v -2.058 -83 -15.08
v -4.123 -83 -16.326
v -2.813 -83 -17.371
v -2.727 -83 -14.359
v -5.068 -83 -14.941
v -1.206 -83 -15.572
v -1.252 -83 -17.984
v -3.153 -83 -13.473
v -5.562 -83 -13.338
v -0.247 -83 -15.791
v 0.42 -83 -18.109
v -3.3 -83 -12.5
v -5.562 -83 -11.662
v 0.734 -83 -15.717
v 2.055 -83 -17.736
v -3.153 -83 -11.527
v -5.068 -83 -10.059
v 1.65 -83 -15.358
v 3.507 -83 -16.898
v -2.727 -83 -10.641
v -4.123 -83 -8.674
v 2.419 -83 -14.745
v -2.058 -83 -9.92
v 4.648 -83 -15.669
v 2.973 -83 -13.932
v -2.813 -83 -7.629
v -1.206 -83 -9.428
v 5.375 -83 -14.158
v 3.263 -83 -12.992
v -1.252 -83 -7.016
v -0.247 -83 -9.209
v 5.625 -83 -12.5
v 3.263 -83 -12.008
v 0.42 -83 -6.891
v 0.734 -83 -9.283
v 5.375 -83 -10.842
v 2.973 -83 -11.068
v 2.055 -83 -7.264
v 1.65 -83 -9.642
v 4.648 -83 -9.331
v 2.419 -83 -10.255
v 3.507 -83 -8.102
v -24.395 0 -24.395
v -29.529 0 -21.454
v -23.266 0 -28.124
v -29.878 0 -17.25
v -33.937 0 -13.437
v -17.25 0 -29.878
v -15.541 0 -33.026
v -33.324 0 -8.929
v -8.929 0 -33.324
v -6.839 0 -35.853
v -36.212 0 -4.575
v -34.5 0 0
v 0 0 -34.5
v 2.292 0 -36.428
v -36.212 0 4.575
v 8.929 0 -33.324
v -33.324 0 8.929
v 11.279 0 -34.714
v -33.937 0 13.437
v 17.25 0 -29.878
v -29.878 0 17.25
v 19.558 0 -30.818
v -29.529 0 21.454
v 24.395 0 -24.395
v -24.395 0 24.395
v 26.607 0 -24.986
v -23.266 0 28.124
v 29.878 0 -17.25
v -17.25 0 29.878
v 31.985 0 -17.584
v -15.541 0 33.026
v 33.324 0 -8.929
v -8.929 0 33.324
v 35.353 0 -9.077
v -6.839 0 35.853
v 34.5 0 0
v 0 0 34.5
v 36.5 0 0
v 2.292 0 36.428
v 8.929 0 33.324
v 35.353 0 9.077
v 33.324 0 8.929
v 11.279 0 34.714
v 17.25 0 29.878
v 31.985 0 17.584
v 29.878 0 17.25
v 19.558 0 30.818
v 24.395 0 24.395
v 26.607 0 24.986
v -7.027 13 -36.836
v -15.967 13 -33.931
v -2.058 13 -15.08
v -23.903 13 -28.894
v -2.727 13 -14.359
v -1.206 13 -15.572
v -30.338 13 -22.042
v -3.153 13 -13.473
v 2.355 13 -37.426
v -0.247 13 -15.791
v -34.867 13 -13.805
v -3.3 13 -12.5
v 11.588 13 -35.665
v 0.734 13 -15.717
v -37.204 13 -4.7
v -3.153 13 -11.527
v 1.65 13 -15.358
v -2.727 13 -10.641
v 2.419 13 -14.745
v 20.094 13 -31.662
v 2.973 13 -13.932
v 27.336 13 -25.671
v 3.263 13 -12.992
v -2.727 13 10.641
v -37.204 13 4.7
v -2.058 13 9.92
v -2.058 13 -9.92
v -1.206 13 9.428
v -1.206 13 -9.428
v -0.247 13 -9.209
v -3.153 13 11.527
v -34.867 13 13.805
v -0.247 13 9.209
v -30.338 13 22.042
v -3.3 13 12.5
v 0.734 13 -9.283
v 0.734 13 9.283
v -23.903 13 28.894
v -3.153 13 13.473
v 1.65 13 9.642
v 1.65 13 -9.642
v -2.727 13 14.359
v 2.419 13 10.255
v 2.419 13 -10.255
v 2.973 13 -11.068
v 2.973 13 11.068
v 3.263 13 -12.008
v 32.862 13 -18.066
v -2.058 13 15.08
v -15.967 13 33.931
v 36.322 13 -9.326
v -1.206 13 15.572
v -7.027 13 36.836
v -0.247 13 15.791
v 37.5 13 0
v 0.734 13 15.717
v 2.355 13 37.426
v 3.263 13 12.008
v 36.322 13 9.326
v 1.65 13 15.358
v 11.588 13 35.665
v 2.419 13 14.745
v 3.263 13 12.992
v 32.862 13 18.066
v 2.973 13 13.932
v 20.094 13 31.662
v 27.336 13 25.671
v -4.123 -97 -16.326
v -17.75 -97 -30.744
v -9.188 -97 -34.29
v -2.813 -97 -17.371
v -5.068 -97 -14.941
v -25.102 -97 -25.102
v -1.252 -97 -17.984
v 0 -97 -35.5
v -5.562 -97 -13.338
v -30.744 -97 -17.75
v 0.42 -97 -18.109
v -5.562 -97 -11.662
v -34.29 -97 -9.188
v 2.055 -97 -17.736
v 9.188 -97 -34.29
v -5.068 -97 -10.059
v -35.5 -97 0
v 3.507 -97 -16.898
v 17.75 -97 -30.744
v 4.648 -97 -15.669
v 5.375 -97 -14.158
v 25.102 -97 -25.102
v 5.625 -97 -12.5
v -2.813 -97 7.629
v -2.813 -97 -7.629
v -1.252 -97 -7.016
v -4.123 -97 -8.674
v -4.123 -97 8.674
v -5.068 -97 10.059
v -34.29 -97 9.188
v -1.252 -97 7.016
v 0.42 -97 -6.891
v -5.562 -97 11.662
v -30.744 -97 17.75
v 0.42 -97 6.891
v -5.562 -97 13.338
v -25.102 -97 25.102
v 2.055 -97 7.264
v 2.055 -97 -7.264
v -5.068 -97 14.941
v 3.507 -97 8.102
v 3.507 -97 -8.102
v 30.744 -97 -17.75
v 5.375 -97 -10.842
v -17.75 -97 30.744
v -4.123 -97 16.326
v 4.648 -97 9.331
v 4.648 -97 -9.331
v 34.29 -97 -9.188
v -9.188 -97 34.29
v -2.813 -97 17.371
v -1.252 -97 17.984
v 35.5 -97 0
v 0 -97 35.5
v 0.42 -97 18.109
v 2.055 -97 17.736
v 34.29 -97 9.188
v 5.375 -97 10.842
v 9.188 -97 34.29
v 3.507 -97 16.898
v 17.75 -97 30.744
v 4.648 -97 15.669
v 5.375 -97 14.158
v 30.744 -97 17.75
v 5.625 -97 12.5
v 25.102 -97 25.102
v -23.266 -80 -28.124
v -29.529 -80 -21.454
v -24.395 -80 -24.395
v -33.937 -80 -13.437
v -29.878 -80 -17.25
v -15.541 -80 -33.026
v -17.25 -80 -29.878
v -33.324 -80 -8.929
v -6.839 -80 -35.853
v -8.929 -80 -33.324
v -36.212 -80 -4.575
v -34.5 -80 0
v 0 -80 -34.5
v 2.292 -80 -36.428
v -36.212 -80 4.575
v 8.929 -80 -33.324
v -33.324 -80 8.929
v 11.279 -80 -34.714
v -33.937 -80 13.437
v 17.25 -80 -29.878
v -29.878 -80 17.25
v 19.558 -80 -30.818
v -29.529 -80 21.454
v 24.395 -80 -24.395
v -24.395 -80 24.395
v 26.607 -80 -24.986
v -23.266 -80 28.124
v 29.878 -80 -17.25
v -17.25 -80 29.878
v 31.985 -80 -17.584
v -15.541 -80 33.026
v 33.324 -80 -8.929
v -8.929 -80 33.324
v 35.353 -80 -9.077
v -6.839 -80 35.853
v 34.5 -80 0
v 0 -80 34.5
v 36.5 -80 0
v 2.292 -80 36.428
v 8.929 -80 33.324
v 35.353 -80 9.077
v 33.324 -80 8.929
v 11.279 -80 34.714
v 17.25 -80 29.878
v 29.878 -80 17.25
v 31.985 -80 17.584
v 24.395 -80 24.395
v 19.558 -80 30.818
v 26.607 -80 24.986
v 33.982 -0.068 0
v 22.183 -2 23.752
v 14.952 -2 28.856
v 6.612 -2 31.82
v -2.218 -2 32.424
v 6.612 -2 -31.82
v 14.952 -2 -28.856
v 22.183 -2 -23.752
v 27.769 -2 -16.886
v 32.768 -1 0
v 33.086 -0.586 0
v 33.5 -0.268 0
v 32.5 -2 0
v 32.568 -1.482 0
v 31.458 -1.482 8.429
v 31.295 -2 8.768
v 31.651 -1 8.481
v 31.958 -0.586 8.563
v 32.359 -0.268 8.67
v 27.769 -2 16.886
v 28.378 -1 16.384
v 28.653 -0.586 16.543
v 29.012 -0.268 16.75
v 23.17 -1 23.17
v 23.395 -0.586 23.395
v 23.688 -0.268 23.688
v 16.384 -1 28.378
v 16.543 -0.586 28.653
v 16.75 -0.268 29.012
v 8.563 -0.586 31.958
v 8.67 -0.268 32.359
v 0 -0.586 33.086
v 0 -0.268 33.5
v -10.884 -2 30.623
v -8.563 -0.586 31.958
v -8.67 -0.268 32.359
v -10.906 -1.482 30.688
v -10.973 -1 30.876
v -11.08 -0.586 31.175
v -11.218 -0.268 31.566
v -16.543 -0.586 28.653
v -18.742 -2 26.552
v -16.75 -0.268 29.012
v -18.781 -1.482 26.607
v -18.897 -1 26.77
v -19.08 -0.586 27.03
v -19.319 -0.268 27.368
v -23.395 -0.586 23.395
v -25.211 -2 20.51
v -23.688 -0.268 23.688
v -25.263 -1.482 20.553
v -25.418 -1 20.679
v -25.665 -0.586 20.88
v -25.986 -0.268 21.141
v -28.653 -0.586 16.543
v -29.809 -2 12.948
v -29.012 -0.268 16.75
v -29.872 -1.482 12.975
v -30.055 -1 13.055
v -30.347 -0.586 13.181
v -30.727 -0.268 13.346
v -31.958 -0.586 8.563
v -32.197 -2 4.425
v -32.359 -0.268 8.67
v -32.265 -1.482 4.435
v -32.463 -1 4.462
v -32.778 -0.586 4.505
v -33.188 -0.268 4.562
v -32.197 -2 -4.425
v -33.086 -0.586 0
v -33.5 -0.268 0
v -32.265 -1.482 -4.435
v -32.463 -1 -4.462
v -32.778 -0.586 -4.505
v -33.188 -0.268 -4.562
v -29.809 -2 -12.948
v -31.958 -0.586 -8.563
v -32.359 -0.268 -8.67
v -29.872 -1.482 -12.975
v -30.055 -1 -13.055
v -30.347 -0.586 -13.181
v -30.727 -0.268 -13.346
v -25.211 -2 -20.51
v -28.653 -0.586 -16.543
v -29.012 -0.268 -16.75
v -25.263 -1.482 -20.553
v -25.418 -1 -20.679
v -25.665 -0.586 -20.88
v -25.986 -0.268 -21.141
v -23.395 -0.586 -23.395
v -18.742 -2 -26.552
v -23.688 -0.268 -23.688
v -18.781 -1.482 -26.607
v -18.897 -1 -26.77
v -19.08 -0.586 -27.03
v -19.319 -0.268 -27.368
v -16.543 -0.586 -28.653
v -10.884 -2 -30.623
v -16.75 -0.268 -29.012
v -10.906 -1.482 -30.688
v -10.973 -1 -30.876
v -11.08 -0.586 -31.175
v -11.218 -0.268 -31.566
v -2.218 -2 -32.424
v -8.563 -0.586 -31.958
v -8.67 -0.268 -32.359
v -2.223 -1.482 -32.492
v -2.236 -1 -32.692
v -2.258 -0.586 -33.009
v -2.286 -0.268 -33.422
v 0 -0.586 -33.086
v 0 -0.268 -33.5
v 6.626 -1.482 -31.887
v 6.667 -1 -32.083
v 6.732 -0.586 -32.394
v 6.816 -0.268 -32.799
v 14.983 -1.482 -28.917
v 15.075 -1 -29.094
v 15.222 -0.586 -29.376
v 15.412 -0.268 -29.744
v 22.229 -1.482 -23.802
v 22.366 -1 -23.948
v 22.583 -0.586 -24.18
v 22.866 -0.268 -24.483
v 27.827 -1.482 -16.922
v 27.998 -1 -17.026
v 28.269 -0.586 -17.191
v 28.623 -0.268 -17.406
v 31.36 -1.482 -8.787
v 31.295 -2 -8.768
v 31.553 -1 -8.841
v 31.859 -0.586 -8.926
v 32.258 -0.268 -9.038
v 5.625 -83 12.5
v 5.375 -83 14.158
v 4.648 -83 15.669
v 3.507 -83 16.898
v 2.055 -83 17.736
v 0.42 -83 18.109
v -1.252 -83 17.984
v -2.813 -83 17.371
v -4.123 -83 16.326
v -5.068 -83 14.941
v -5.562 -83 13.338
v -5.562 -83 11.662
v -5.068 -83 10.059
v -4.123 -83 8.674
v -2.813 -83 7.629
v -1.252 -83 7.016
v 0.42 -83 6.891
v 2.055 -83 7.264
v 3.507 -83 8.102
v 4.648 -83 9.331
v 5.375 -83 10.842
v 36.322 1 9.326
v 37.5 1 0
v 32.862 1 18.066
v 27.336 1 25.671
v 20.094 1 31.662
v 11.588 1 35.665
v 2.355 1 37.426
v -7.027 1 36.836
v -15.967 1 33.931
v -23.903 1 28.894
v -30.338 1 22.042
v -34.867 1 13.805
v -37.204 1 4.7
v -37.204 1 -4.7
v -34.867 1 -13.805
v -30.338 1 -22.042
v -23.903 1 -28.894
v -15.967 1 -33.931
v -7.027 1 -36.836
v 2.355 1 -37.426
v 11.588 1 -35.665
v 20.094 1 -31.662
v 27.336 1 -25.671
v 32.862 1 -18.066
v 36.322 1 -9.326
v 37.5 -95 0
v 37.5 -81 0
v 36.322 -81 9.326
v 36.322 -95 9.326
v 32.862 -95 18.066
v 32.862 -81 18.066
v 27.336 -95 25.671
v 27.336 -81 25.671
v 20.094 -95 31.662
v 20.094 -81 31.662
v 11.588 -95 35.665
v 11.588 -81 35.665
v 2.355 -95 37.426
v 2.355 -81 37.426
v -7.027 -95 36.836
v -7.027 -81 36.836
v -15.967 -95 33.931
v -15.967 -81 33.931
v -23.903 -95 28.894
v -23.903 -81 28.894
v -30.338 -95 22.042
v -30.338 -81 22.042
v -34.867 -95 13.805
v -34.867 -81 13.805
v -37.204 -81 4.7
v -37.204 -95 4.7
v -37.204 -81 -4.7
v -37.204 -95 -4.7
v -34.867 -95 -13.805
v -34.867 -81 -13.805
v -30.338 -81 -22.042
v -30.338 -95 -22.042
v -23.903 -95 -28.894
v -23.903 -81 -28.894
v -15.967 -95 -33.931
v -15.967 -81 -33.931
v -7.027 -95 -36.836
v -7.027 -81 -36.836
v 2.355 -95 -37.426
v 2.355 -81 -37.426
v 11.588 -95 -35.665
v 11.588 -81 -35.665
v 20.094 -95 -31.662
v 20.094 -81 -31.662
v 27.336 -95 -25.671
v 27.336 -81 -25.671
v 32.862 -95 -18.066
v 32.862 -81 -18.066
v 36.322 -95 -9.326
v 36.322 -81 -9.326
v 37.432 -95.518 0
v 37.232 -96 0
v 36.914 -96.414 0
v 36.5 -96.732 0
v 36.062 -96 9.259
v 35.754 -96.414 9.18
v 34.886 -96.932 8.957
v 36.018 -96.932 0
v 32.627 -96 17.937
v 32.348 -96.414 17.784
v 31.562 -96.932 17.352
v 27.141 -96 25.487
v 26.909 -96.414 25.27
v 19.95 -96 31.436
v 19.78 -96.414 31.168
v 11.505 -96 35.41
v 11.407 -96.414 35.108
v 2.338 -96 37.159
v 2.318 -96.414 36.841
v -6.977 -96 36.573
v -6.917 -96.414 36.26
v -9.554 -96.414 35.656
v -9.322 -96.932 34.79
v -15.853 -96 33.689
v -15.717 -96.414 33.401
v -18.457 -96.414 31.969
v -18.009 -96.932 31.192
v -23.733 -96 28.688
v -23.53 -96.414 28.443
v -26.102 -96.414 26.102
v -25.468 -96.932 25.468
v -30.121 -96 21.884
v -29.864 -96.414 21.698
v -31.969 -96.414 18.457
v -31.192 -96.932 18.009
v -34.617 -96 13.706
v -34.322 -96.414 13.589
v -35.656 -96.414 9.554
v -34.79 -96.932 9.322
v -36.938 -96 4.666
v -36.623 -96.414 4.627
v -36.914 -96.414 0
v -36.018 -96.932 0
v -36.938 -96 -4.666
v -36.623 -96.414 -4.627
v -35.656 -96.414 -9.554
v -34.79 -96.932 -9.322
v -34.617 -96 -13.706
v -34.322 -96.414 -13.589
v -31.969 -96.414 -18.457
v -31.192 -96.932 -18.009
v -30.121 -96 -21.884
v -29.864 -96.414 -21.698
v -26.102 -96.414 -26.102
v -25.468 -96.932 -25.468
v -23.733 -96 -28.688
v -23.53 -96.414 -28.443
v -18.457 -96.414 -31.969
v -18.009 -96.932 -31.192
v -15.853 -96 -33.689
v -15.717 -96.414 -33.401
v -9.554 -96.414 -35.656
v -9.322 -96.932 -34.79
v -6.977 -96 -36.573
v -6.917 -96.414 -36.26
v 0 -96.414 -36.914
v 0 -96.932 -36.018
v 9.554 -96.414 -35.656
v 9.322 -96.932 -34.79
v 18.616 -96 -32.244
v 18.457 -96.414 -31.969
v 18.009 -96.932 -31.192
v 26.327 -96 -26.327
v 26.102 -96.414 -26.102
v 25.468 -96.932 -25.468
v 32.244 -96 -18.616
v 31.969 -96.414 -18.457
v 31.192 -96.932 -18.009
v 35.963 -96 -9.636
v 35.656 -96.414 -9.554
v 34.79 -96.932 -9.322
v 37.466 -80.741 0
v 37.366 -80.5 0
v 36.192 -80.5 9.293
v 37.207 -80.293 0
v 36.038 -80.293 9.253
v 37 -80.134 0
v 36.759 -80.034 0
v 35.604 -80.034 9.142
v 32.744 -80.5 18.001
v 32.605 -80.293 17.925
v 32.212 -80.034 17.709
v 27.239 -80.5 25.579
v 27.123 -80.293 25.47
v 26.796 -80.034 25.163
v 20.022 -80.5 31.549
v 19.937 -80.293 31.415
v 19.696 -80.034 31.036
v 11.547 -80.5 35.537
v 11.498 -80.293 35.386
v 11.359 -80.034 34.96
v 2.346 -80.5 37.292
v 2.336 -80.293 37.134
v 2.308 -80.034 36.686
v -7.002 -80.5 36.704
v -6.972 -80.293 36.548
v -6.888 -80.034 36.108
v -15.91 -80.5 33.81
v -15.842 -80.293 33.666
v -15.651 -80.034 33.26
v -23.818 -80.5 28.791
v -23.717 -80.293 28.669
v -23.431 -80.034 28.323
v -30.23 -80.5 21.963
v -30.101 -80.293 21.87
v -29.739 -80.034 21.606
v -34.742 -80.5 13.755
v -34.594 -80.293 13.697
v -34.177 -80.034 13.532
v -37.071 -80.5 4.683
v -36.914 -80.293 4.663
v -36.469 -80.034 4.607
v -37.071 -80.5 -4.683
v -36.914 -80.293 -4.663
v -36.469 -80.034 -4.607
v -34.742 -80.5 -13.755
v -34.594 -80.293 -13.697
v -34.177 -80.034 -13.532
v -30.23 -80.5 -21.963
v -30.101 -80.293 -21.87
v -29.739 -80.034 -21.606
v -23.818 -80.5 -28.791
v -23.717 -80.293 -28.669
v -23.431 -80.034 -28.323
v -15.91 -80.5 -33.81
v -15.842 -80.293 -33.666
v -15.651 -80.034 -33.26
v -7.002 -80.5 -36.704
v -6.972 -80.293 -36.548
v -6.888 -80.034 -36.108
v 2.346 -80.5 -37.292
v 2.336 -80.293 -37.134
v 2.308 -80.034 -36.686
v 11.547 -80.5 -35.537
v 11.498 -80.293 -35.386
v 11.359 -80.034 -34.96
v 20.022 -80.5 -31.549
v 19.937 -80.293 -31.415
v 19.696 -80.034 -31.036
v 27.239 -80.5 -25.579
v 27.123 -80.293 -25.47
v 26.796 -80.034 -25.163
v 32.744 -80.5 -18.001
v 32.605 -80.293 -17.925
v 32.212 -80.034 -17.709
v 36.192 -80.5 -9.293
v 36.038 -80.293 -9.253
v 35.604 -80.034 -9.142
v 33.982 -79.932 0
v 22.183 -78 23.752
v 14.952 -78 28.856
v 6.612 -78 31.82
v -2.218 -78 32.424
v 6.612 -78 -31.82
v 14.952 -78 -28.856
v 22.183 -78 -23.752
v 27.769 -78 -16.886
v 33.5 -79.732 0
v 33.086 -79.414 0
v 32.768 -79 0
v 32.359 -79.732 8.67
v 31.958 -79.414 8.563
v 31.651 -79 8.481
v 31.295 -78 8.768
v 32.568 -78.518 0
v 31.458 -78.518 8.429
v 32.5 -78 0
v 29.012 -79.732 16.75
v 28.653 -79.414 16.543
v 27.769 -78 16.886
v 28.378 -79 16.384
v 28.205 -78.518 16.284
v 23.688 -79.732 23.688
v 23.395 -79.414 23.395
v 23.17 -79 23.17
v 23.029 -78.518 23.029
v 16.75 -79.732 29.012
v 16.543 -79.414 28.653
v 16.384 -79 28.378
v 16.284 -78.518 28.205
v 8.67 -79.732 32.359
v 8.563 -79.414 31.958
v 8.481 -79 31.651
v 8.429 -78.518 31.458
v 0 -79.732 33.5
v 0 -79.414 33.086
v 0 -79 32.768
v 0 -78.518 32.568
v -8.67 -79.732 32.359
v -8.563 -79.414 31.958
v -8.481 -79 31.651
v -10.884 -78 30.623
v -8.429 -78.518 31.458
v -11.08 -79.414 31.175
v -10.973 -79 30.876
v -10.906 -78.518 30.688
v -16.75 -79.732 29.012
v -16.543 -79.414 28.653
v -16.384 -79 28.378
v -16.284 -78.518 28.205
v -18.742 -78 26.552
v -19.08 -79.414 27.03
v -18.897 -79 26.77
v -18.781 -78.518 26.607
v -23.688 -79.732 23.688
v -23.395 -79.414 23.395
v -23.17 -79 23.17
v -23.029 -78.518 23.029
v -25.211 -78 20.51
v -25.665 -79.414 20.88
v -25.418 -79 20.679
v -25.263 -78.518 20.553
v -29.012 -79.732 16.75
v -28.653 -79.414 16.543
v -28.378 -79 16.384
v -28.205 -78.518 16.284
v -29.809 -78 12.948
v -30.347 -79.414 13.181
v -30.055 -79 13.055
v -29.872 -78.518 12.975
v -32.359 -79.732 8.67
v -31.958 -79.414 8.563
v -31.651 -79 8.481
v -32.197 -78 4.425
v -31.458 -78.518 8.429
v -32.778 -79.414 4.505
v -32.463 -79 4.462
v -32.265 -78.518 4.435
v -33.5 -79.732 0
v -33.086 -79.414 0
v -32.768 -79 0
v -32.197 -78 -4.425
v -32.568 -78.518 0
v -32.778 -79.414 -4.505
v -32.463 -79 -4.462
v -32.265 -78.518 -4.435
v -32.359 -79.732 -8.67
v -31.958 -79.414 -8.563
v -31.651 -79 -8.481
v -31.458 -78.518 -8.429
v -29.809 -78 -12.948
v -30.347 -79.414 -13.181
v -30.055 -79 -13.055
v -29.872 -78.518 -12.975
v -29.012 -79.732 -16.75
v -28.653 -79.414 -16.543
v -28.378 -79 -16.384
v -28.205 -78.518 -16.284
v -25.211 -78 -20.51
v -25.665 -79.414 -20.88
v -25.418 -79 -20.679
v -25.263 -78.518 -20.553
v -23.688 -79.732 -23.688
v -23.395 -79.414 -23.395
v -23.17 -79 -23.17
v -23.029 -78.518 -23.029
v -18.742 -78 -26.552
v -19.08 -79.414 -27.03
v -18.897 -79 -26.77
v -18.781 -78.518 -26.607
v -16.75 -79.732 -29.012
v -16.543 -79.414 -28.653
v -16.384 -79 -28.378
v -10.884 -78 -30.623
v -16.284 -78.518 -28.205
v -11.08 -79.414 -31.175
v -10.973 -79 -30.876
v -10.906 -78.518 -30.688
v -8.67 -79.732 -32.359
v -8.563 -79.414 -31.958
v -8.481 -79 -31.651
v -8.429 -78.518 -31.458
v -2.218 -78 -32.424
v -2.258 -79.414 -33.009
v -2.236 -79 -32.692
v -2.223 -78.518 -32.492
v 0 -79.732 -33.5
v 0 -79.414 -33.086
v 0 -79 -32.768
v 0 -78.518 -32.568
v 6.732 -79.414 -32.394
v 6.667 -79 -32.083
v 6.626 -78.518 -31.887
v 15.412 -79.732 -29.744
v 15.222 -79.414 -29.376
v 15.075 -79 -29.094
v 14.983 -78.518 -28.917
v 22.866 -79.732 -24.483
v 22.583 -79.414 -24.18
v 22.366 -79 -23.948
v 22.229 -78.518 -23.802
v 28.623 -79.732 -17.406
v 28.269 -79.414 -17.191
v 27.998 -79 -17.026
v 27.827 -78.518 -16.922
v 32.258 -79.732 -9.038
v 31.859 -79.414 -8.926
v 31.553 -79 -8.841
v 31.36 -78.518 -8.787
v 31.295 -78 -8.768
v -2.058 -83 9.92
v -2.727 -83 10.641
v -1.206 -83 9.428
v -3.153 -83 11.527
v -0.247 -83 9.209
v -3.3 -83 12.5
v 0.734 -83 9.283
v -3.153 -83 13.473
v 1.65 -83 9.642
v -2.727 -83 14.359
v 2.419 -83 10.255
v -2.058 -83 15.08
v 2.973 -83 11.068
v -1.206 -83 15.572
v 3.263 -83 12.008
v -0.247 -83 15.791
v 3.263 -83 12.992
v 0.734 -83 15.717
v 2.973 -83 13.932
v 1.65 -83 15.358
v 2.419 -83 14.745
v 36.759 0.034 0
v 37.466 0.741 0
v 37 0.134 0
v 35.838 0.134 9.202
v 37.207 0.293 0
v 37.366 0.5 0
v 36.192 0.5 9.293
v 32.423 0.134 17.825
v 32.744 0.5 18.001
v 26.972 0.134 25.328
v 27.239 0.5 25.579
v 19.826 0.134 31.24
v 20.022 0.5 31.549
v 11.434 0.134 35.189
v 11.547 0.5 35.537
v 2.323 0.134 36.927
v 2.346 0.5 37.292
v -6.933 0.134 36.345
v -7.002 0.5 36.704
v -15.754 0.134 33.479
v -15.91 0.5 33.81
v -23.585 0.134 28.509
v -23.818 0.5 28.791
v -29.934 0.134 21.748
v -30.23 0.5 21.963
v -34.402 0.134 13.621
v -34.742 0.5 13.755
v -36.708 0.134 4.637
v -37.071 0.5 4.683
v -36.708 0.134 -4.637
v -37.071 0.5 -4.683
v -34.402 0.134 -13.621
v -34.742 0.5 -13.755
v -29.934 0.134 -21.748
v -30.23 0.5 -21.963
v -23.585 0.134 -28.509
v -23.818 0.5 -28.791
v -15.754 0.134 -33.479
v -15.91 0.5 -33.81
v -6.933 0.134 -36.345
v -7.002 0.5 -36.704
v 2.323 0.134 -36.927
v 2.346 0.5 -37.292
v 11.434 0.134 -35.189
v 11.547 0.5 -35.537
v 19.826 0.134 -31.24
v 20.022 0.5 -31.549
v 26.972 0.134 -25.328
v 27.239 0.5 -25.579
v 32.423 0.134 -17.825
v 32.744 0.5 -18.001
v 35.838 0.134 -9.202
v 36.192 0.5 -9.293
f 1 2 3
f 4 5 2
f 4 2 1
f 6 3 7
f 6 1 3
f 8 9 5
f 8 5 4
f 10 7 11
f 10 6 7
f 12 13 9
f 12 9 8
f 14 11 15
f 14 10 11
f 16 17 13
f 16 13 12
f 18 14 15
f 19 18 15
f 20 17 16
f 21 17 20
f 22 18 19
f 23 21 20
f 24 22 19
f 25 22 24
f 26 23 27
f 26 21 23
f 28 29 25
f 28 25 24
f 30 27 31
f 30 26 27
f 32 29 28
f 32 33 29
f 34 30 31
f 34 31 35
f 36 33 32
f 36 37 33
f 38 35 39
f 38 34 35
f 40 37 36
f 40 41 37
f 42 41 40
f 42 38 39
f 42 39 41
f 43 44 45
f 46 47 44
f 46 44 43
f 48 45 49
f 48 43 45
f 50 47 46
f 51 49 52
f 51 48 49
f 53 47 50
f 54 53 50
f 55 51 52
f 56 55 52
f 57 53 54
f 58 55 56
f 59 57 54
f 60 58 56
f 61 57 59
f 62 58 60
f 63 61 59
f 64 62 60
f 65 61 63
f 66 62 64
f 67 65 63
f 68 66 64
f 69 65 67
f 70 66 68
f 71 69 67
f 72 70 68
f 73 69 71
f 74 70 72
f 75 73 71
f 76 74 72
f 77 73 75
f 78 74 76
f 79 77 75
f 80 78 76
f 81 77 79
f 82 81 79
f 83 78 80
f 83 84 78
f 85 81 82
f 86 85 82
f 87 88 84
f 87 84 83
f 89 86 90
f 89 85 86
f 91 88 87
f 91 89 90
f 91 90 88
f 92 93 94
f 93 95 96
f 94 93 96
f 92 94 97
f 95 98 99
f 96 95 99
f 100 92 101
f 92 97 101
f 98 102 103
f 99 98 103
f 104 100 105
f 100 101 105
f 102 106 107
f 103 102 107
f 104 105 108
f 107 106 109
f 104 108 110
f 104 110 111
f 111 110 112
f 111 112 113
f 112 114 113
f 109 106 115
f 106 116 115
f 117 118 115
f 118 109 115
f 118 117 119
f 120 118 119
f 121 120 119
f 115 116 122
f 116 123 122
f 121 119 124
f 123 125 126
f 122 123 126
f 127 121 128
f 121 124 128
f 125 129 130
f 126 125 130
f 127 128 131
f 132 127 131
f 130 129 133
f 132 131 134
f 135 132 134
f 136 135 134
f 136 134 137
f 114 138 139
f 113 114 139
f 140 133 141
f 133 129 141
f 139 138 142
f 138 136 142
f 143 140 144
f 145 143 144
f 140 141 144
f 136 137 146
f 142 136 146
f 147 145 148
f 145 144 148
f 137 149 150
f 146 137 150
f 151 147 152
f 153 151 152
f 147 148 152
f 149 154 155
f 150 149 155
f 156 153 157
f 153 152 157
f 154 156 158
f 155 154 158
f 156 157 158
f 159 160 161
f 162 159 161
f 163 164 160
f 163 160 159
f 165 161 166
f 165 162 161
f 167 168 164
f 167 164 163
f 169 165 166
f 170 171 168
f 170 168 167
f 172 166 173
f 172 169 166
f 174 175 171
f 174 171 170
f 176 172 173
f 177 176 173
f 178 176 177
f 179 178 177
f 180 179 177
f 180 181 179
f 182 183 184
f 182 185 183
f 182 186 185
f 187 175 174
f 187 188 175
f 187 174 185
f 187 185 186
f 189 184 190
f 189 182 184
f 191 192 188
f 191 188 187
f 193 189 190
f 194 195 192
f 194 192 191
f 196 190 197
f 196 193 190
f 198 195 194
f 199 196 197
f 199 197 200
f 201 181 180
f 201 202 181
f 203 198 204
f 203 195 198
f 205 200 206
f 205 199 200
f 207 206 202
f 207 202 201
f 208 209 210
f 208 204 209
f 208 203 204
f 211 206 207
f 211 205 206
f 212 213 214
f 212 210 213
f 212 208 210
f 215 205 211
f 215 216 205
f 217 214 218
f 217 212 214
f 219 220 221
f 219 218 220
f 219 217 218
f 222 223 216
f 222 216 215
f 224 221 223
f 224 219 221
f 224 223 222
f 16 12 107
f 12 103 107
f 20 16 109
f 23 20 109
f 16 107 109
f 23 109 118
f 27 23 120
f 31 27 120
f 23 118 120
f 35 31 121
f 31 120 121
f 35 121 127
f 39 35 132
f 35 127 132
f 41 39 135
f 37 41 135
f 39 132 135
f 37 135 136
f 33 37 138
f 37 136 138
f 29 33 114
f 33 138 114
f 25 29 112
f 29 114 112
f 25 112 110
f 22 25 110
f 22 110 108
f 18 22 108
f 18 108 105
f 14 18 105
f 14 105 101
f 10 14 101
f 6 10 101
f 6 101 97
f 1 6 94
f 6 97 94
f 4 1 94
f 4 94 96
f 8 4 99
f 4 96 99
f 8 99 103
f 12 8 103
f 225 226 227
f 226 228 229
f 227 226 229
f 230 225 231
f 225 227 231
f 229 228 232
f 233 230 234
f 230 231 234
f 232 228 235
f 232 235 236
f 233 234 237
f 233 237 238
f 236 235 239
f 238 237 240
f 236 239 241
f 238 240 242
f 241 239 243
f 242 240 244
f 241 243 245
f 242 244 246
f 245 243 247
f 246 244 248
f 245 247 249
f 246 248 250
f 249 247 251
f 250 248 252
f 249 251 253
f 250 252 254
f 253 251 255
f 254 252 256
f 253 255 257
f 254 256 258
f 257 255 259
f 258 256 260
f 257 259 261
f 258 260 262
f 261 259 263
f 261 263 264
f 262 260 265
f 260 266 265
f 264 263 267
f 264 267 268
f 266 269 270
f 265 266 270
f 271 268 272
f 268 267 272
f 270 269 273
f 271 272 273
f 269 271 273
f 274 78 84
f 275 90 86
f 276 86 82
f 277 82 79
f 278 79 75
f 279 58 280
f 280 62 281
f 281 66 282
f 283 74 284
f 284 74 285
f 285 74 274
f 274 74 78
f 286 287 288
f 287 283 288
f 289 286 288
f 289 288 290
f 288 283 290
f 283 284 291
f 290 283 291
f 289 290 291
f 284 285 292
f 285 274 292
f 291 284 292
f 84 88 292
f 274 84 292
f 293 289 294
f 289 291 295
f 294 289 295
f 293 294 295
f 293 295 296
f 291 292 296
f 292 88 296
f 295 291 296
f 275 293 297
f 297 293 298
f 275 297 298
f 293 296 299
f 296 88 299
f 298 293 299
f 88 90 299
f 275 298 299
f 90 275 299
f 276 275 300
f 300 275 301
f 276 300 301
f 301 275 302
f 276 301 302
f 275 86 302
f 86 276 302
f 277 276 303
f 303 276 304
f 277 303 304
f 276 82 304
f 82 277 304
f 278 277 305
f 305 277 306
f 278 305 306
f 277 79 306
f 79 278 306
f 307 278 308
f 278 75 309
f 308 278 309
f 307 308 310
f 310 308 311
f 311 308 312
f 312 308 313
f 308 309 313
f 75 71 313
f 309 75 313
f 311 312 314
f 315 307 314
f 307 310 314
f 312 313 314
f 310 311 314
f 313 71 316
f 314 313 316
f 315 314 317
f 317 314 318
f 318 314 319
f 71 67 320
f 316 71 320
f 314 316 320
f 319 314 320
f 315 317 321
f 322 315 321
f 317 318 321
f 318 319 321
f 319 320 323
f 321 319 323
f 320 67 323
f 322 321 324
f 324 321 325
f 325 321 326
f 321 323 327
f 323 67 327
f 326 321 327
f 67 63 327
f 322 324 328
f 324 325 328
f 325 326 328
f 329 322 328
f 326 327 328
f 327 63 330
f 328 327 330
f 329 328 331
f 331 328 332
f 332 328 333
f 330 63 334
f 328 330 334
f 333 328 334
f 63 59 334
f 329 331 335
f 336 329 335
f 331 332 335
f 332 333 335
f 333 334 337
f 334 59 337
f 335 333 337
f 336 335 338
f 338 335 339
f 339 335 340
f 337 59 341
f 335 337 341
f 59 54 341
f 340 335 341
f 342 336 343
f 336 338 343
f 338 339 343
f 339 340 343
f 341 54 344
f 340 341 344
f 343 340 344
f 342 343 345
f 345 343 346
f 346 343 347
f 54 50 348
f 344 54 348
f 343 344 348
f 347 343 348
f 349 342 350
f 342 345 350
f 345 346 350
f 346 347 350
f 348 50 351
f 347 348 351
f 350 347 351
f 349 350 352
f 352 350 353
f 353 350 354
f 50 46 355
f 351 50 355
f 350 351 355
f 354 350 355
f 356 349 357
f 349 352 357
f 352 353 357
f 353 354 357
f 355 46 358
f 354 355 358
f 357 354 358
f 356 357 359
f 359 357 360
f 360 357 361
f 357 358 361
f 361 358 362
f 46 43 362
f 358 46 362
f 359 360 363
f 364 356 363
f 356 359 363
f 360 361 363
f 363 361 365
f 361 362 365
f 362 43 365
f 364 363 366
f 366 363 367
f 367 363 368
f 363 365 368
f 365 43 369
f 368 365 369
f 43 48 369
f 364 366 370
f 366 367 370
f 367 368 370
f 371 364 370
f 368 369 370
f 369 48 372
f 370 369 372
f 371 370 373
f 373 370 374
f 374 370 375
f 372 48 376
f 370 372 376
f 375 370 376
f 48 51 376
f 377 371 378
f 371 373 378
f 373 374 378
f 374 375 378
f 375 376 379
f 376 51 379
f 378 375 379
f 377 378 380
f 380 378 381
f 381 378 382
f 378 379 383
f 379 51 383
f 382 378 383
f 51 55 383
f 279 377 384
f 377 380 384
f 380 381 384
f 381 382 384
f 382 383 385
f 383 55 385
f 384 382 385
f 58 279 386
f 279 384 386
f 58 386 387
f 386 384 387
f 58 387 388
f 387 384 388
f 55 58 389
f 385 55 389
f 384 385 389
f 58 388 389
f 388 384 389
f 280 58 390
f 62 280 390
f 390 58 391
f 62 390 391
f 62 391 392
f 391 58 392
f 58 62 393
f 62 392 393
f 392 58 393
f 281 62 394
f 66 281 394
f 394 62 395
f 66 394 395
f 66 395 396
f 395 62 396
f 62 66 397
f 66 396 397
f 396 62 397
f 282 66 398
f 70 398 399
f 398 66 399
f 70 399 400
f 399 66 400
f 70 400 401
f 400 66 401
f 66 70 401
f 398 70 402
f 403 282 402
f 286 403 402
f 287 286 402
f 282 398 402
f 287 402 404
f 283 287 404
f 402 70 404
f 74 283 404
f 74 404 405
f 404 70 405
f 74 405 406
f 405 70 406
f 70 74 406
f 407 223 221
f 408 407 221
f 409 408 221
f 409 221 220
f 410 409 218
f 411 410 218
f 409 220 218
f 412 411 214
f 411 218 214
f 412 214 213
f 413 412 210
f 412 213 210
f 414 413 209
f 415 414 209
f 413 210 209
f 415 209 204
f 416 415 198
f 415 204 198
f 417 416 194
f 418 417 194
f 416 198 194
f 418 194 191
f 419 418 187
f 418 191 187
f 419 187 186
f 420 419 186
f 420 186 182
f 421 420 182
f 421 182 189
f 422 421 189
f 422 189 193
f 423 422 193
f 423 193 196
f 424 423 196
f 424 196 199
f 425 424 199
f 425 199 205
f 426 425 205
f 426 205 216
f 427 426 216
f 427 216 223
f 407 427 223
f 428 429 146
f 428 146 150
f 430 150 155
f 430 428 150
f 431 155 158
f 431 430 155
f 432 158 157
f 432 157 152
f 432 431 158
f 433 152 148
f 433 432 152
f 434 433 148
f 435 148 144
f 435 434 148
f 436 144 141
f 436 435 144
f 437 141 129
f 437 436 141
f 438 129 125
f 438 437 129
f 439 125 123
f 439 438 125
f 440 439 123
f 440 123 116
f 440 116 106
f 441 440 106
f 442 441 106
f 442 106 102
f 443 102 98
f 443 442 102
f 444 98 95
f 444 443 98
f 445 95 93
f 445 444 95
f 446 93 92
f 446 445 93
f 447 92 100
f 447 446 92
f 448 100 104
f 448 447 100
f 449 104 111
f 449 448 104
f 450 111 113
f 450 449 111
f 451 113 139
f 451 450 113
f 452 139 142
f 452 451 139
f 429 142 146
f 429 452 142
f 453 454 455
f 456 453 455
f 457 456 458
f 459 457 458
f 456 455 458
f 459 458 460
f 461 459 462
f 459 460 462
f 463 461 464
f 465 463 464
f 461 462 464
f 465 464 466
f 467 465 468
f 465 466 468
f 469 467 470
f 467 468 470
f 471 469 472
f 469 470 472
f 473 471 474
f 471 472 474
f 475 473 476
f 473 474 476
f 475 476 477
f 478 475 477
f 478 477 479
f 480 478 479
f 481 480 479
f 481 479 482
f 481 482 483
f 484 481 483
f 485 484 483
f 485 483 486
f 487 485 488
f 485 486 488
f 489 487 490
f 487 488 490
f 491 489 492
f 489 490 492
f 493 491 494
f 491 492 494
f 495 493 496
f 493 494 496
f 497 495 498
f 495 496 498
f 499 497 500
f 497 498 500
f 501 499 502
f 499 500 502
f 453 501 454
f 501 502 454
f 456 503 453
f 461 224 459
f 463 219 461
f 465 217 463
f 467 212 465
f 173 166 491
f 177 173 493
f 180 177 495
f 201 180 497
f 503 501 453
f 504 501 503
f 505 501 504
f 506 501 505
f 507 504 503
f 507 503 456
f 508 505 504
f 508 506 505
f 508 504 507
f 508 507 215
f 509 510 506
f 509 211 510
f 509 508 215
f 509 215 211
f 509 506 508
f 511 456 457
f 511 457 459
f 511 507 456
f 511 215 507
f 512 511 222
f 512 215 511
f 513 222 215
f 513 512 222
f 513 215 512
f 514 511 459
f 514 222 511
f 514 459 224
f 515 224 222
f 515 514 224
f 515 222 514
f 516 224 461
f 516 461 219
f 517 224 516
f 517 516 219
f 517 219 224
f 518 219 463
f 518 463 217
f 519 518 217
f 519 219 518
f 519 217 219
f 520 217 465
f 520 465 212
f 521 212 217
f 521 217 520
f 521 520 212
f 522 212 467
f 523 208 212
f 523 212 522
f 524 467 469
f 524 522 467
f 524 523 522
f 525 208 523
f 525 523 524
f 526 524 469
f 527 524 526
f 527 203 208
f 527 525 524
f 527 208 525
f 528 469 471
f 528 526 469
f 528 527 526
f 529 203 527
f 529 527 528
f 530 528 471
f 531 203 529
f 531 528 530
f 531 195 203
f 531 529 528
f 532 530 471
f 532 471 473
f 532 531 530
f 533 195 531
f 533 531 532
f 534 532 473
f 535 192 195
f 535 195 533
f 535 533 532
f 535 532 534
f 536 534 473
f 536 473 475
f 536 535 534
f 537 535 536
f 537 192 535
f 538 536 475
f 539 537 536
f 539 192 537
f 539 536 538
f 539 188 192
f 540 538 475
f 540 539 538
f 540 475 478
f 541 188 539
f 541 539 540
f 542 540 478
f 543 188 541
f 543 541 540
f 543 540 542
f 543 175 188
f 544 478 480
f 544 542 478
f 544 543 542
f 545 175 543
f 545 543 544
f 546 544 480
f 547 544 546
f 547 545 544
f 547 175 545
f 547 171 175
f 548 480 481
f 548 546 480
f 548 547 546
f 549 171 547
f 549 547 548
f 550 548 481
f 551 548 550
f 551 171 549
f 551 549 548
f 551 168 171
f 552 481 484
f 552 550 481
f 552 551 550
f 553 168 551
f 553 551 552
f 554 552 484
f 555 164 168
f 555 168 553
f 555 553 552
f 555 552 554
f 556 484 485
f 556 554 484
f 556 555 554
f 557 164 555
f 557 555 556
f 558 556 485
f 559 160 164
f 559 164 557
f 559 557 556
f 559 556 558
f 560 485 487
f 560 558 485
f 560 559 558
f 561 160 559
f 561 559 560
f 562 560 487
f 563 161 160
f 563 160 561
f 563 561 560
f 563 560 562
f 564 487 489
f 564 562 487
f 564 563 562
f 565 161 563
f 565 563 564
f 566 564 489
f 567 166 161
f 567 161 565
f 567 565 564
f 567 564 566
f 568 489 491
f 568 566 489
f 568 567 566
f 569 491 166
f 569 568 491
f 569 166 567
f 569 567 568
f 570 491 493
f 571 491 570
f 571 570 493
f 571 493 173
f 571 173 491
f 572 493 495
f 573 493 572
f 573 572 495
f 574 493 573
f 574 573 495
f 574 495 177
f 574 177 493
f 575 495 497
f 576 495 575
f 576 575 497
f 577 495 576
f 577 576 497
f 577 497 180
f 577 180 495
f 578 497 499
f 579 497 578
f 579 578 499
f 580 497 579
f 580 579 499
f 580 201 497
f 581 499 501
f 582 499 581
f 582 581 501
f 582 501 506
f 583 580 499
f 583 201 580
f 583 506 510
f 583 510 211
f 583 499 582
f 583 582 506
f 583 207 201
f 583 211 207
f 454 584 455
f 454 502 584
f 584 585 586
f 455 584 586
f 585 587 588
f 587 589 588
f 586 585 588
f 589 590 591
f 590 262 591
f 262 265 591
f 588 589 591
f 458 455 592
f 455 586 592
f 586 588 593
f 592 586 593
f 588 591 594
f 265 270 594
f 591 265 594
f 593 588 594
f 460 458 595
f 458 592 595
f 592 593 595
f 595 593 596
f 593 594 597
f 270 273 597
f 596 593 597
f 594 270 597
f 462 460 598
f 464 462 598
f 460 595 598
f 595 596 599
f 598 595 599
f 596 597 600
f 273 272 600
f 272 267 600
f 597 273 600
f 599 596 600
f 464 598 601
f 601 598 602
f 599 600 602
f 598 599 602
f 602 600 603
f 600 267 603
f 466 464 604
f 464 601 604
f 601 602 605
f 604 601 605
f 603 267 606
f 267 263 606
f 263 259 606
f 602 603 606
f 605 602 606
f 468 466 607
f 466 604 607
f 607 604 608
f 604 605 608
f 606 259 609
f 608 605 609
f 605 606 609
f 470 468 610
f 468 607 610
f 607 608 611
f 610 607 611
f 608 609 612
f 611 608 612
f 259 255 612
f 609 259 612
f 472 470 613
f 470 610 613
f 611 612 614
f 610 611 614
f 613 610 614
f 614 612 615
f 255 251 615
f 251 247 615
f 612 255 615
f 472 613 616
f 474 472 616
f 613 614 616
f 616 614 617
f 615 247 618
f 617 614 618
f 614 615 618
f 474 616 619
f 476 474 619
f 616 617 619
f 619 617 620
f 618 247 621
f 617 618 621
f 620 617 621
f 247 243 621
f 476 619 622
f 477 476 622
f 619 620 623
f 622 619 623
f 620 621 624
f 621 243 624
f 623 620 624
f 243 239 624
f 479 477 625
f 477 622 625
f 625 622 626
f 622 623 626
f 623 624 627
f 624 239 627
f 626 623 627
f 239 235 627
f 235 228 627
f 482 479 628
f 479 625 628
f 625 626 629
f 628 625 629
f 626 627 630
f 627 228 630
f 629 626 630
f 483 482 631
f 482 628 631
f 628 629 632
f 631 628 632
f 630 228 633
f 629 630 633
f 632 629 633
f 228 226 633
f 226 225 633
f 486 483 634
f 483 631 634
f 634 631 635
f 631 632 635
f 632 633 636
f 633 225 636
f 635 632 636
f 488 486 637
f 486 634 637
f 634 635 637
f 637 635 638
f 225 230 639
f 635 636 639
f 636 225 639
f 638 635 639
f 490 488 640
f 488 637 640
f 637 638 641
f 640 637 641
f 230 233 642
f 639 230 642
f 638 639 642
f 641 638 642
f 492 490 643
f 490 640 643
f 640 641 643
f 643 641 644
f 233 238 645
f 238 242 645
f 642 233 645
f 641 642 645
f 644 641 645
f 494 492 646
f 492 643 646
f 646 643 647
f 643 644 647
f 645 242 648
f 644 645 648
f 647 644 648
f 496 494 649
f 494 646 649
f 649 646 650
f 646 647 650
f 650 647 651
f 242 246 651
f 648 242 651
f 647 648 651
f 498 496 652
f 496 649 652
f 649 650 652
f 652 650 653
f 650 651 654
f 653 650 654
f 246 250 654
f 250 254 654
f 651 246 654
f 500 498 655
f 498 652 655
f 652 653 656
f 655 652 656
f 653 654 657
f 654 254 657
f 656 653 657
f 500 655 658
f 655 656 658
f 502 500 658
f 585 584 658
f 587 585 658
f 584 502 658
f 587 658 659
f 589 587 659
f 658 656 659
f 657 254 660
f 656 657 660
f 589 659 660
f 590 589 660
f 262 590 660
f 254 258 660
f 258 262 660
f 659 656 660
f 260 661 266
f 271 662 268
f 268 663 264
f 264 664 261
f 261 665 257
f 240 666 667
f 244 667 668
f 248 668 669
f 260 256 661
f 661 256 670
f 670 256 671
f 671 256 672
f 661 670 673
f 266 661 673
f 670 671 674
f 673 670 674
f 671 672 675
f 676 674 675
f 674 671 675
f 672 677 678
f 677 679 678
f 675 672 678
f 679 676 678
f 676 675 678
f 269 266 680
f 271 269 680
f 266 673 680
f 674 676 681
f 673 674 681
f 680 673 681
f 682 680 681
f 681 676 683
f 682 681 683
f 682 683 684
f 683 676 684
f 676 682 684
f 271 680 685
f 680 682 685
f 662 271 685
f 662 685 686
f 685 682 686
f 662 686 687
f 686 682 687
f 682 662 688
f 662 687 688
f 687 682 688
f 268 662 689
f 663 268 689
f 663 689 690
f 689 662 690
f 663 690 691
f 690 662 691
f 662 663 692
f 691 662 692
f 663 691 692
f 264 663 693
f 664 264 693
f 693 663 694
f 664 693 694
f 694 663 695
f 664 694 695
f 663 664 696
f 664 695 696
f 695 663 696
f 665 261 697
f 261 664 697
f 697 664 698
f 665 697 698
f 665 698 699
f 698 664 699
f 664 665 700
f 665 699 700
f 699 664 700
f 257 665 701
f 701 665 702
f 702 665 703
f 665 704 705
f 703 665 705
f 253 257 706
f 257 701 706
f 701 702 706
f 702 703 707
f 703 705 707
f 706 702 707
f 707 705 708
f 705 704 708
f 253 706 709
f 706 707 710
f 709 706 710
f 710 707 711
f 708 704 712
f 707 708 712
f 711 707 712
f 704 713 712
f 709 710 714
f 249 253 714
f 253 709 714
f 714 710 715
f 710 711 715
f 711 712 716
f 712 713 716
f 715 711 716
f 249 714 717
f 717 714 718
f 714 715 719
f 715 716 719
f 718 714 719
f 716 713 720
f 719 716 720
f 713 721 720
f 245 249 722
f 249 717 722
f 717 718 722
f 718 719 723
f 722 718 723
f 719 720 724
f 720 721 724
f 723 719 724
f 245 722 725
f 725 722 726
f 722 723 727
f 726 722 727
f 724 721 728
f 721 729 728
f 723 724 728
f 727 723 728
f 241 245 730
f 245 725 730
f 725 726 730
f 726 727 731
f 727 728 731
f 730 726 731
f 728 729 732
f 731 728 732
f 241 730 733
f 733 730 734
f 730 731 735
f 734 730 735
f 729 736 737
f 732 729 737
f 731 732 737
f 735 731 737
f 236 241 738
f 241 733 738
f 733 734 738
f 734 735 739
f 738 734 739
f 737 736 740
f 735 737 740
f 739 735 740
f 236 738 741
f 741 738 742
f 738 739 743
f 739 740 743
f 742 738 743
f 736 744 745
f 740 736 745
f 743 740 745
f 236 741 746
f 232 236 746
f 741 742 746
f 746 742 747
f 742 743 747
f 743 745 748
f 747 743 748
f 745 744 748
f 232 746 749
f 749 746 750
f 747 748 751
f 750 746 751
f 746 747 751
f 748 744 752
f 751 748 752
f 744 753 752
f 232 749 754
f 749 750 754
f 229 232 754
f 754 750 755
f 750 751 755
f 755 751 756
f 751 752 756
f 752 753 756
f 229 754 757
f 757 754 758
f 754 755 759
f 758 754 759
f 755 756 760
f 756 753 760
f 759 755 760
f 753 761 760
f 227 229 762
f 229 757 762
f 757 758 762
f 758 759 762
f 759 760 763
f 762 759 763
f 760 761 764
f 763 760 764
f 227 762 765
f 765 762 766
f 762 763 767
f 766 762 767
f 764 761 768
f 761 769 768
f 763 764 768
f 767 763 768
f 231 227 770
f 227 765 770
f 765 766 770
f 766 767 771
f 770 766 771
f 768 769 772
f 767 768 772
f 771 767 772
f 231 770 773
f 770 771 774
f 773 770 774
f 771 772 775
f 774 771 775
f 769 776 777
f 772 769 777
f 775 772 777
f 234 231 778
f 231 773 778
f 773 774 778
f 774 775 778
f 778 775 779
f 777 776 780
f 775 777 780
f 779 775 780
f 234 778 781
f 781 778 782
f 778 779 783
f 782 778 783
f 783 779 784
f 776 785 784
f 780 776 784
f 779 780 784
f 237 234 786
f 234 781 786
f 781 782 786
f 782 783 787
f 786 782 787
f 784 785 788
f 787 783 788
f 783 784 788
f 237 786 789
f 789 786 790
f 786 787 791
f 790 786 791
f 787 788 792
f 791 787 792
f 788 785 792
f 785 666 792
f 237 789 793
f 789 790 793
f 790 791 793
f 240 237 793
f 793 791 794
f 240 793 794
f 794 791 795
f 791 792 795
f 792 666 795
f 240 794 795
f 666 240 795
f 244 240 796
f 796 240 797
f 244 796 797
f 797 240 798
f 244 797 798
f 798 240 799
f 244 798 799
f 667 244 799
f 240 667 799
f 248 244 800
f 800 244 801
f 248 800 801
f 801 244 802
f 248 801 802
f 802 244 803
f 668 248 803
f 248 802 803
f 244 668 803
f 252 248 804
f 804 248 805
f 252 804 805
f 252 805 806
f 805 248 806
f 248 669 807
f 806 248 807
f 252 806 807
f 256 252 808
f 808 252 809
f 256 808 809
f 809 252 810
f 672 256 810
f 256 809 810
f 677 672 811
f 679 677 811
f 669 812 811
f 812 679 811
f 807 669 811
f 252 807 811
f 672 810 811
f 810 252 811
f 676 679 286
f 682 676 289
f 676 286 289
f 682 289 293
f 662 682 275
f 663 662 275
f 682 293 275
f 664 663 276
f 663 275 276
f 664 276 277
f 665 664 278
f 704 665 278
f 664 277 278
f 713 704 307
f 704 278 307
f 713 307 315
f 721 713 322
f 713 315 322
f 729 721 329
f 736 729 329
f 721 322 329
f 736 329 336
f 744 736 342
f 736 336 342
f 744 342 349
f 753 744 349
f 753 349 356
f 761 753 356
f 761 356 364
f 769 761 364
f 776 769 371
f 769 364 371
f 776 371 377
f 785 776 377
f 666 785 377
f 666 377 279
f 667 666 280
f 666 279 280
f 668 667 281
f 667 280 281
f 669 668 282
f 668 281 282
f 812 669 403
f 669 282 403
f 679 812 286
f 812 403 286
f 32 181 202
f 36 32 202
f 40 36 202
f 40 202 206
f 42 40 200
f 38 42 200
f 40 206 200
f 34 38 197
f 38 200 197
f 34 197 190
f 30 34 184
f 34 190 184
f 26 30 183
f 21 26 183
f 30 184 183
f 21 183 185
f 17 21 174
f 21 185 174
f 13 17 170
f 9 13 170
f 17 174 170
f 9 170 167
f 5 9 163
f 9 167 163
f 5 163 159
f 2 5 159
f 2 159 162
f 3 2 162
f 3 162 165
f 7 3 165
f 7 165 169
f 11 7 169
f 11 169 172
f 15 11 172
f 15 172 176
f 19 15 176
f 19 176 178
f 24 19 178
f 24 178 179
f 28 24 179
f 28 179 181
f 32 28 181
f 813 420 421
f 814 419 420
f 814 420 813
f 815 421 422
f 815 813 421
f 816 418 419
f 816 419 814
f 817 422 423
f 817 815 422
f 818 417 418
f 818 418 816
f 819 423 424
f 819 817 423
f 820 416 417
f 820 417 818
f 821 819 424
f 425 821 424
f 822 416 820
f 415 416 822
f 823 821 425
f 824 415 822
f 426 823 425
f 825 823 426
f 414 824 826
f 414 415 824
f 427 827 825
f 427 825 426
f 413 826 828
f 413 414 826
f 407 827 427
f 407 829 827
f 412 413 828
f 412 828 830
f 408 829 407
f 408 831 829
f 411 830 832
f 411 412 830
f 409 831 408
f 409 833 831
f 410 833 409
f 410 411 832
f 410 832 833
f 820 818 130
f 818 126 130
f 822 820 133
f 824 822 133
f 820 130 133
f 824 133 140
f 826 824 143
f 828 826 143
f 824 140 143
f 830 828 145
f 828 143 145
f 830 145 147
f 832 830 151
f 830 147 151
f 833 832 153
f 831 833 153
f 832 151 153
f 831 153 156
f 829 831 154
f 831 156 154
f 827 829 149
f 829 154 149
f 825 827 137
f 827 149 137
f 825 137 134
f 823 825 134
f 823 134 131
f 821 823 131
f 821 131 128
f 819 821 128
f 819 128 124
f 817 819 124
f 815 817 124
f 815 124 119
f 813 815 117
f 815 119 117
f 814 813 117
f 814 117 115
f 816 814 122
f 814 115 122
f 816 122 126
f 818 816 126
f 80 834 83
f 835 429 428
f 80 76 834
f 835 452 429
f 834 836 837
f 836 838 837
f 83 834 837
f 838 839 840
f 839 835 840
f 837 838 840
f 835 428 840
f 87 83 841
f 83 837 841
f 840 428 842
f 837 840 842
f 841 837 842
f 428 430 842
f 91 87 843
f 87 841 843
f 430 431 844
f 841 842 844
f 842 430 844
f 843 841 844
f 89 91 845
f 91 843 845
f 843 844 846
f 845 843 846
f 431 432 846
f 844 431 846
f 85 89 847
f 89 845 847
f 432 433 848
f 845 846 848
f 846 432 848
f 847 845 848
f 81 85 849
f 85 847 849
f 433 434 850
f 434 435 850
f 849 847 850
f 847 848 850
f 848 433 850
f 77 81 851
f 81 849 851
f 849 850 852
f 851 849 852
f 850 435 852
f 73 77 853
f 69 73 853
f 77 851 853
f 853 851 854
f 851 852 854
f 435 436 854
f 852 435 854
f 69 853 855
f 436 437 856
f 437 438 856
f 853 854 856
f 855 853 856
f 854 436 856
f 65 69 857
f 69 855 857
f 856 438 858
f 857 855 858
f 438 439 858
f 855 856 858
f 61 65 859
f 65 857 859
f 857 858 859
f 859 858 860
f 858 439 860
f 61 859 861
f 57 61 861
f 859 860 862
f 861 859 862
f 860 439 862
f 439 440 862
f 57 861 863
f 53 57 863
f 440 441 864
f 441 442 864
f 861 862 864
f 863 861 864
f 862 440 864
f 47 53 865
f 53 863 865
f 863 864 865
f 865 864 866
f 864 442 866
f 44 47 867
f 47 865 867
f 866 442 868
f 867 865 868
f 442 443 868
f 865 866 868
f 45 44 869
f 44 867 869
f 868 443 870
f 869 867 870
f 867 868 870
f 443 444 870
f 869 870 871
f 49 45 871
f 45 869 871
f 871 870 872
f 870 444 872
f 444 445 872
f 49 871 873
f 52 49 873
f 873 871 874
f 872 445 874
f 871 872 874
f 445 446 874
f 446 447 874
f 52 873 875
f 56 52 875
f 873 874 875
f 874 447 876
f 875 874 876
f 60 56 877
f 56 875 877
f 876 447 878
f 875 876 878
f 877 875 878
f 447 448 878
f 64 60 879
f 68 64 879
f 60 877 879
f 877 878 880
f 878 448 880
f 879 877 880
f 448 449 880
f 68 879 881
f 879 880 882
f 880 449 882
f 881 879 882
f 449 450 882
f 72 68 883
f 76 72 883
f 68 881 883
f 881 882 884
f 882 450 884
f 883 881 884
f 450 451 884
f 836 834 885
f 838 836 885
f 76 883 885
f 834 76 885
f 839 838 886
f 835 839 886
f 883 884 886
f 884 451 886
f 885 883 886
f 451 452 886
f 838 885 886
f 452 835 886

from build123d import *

# Parameters (mm, degrees)
F0_R           = 32.5
F1_DEPTH       = 80
F2_R           = 37.5
F3_DEPTH       = 13
F4_R           = 37.5
F5_DEPTH       = 17
F6_R           = 2
F8_D           = 6.6
F8_CBORE_D     = 11.25
F8_CBORE_DEPTH = 14
F9_R           = 1


with BuildPart() as f1:
    # F0 (on Front) → F1 (new body)
    with BuildSketch(Plane.XZ):
        Circle(F0_R)
    extrude(amount=F1_DEPTH)

    # F2 (on Front) → F3 (join)
    with BuildSketch(Plane.XZ):
        Circle(F2_R)
    extrude(amount=-F3_DEPTH)

    # F4 (on face) → F5 (join)
    with BuildSketch(Plane.XZ.offset(80)):
        Circle(F4_R)
    extrude(amount=F5_DEPTH)

    # F6
    f6_edges = [f1.edges().sort_by_distance(p)[0] for p in [
        (-32.5, 0, 0),
        (-37.5, -97, 0),
        (-32.5, -80, 0),
    ]]
    fillet(f6_edges, radius=F6_R)

    # F8 (through all)
    with Locations(Plane.XZ.offset(97)):
        with Locations((0, 12.5), (0, -12.5)):
            CounterBoreHole(F8_D / 2, F8_CBORE_D / 2, F8_CBORE_DEPTH)

    # F9
    f9_edges = [f1.edges().sort_by_distance(p)[0] for p in [
        (-37.5, 0, 0),
        (-37.5, -80, 0),
    ]]
    fillet(f9_edges, radius=F9_R)


solid = f1.part
